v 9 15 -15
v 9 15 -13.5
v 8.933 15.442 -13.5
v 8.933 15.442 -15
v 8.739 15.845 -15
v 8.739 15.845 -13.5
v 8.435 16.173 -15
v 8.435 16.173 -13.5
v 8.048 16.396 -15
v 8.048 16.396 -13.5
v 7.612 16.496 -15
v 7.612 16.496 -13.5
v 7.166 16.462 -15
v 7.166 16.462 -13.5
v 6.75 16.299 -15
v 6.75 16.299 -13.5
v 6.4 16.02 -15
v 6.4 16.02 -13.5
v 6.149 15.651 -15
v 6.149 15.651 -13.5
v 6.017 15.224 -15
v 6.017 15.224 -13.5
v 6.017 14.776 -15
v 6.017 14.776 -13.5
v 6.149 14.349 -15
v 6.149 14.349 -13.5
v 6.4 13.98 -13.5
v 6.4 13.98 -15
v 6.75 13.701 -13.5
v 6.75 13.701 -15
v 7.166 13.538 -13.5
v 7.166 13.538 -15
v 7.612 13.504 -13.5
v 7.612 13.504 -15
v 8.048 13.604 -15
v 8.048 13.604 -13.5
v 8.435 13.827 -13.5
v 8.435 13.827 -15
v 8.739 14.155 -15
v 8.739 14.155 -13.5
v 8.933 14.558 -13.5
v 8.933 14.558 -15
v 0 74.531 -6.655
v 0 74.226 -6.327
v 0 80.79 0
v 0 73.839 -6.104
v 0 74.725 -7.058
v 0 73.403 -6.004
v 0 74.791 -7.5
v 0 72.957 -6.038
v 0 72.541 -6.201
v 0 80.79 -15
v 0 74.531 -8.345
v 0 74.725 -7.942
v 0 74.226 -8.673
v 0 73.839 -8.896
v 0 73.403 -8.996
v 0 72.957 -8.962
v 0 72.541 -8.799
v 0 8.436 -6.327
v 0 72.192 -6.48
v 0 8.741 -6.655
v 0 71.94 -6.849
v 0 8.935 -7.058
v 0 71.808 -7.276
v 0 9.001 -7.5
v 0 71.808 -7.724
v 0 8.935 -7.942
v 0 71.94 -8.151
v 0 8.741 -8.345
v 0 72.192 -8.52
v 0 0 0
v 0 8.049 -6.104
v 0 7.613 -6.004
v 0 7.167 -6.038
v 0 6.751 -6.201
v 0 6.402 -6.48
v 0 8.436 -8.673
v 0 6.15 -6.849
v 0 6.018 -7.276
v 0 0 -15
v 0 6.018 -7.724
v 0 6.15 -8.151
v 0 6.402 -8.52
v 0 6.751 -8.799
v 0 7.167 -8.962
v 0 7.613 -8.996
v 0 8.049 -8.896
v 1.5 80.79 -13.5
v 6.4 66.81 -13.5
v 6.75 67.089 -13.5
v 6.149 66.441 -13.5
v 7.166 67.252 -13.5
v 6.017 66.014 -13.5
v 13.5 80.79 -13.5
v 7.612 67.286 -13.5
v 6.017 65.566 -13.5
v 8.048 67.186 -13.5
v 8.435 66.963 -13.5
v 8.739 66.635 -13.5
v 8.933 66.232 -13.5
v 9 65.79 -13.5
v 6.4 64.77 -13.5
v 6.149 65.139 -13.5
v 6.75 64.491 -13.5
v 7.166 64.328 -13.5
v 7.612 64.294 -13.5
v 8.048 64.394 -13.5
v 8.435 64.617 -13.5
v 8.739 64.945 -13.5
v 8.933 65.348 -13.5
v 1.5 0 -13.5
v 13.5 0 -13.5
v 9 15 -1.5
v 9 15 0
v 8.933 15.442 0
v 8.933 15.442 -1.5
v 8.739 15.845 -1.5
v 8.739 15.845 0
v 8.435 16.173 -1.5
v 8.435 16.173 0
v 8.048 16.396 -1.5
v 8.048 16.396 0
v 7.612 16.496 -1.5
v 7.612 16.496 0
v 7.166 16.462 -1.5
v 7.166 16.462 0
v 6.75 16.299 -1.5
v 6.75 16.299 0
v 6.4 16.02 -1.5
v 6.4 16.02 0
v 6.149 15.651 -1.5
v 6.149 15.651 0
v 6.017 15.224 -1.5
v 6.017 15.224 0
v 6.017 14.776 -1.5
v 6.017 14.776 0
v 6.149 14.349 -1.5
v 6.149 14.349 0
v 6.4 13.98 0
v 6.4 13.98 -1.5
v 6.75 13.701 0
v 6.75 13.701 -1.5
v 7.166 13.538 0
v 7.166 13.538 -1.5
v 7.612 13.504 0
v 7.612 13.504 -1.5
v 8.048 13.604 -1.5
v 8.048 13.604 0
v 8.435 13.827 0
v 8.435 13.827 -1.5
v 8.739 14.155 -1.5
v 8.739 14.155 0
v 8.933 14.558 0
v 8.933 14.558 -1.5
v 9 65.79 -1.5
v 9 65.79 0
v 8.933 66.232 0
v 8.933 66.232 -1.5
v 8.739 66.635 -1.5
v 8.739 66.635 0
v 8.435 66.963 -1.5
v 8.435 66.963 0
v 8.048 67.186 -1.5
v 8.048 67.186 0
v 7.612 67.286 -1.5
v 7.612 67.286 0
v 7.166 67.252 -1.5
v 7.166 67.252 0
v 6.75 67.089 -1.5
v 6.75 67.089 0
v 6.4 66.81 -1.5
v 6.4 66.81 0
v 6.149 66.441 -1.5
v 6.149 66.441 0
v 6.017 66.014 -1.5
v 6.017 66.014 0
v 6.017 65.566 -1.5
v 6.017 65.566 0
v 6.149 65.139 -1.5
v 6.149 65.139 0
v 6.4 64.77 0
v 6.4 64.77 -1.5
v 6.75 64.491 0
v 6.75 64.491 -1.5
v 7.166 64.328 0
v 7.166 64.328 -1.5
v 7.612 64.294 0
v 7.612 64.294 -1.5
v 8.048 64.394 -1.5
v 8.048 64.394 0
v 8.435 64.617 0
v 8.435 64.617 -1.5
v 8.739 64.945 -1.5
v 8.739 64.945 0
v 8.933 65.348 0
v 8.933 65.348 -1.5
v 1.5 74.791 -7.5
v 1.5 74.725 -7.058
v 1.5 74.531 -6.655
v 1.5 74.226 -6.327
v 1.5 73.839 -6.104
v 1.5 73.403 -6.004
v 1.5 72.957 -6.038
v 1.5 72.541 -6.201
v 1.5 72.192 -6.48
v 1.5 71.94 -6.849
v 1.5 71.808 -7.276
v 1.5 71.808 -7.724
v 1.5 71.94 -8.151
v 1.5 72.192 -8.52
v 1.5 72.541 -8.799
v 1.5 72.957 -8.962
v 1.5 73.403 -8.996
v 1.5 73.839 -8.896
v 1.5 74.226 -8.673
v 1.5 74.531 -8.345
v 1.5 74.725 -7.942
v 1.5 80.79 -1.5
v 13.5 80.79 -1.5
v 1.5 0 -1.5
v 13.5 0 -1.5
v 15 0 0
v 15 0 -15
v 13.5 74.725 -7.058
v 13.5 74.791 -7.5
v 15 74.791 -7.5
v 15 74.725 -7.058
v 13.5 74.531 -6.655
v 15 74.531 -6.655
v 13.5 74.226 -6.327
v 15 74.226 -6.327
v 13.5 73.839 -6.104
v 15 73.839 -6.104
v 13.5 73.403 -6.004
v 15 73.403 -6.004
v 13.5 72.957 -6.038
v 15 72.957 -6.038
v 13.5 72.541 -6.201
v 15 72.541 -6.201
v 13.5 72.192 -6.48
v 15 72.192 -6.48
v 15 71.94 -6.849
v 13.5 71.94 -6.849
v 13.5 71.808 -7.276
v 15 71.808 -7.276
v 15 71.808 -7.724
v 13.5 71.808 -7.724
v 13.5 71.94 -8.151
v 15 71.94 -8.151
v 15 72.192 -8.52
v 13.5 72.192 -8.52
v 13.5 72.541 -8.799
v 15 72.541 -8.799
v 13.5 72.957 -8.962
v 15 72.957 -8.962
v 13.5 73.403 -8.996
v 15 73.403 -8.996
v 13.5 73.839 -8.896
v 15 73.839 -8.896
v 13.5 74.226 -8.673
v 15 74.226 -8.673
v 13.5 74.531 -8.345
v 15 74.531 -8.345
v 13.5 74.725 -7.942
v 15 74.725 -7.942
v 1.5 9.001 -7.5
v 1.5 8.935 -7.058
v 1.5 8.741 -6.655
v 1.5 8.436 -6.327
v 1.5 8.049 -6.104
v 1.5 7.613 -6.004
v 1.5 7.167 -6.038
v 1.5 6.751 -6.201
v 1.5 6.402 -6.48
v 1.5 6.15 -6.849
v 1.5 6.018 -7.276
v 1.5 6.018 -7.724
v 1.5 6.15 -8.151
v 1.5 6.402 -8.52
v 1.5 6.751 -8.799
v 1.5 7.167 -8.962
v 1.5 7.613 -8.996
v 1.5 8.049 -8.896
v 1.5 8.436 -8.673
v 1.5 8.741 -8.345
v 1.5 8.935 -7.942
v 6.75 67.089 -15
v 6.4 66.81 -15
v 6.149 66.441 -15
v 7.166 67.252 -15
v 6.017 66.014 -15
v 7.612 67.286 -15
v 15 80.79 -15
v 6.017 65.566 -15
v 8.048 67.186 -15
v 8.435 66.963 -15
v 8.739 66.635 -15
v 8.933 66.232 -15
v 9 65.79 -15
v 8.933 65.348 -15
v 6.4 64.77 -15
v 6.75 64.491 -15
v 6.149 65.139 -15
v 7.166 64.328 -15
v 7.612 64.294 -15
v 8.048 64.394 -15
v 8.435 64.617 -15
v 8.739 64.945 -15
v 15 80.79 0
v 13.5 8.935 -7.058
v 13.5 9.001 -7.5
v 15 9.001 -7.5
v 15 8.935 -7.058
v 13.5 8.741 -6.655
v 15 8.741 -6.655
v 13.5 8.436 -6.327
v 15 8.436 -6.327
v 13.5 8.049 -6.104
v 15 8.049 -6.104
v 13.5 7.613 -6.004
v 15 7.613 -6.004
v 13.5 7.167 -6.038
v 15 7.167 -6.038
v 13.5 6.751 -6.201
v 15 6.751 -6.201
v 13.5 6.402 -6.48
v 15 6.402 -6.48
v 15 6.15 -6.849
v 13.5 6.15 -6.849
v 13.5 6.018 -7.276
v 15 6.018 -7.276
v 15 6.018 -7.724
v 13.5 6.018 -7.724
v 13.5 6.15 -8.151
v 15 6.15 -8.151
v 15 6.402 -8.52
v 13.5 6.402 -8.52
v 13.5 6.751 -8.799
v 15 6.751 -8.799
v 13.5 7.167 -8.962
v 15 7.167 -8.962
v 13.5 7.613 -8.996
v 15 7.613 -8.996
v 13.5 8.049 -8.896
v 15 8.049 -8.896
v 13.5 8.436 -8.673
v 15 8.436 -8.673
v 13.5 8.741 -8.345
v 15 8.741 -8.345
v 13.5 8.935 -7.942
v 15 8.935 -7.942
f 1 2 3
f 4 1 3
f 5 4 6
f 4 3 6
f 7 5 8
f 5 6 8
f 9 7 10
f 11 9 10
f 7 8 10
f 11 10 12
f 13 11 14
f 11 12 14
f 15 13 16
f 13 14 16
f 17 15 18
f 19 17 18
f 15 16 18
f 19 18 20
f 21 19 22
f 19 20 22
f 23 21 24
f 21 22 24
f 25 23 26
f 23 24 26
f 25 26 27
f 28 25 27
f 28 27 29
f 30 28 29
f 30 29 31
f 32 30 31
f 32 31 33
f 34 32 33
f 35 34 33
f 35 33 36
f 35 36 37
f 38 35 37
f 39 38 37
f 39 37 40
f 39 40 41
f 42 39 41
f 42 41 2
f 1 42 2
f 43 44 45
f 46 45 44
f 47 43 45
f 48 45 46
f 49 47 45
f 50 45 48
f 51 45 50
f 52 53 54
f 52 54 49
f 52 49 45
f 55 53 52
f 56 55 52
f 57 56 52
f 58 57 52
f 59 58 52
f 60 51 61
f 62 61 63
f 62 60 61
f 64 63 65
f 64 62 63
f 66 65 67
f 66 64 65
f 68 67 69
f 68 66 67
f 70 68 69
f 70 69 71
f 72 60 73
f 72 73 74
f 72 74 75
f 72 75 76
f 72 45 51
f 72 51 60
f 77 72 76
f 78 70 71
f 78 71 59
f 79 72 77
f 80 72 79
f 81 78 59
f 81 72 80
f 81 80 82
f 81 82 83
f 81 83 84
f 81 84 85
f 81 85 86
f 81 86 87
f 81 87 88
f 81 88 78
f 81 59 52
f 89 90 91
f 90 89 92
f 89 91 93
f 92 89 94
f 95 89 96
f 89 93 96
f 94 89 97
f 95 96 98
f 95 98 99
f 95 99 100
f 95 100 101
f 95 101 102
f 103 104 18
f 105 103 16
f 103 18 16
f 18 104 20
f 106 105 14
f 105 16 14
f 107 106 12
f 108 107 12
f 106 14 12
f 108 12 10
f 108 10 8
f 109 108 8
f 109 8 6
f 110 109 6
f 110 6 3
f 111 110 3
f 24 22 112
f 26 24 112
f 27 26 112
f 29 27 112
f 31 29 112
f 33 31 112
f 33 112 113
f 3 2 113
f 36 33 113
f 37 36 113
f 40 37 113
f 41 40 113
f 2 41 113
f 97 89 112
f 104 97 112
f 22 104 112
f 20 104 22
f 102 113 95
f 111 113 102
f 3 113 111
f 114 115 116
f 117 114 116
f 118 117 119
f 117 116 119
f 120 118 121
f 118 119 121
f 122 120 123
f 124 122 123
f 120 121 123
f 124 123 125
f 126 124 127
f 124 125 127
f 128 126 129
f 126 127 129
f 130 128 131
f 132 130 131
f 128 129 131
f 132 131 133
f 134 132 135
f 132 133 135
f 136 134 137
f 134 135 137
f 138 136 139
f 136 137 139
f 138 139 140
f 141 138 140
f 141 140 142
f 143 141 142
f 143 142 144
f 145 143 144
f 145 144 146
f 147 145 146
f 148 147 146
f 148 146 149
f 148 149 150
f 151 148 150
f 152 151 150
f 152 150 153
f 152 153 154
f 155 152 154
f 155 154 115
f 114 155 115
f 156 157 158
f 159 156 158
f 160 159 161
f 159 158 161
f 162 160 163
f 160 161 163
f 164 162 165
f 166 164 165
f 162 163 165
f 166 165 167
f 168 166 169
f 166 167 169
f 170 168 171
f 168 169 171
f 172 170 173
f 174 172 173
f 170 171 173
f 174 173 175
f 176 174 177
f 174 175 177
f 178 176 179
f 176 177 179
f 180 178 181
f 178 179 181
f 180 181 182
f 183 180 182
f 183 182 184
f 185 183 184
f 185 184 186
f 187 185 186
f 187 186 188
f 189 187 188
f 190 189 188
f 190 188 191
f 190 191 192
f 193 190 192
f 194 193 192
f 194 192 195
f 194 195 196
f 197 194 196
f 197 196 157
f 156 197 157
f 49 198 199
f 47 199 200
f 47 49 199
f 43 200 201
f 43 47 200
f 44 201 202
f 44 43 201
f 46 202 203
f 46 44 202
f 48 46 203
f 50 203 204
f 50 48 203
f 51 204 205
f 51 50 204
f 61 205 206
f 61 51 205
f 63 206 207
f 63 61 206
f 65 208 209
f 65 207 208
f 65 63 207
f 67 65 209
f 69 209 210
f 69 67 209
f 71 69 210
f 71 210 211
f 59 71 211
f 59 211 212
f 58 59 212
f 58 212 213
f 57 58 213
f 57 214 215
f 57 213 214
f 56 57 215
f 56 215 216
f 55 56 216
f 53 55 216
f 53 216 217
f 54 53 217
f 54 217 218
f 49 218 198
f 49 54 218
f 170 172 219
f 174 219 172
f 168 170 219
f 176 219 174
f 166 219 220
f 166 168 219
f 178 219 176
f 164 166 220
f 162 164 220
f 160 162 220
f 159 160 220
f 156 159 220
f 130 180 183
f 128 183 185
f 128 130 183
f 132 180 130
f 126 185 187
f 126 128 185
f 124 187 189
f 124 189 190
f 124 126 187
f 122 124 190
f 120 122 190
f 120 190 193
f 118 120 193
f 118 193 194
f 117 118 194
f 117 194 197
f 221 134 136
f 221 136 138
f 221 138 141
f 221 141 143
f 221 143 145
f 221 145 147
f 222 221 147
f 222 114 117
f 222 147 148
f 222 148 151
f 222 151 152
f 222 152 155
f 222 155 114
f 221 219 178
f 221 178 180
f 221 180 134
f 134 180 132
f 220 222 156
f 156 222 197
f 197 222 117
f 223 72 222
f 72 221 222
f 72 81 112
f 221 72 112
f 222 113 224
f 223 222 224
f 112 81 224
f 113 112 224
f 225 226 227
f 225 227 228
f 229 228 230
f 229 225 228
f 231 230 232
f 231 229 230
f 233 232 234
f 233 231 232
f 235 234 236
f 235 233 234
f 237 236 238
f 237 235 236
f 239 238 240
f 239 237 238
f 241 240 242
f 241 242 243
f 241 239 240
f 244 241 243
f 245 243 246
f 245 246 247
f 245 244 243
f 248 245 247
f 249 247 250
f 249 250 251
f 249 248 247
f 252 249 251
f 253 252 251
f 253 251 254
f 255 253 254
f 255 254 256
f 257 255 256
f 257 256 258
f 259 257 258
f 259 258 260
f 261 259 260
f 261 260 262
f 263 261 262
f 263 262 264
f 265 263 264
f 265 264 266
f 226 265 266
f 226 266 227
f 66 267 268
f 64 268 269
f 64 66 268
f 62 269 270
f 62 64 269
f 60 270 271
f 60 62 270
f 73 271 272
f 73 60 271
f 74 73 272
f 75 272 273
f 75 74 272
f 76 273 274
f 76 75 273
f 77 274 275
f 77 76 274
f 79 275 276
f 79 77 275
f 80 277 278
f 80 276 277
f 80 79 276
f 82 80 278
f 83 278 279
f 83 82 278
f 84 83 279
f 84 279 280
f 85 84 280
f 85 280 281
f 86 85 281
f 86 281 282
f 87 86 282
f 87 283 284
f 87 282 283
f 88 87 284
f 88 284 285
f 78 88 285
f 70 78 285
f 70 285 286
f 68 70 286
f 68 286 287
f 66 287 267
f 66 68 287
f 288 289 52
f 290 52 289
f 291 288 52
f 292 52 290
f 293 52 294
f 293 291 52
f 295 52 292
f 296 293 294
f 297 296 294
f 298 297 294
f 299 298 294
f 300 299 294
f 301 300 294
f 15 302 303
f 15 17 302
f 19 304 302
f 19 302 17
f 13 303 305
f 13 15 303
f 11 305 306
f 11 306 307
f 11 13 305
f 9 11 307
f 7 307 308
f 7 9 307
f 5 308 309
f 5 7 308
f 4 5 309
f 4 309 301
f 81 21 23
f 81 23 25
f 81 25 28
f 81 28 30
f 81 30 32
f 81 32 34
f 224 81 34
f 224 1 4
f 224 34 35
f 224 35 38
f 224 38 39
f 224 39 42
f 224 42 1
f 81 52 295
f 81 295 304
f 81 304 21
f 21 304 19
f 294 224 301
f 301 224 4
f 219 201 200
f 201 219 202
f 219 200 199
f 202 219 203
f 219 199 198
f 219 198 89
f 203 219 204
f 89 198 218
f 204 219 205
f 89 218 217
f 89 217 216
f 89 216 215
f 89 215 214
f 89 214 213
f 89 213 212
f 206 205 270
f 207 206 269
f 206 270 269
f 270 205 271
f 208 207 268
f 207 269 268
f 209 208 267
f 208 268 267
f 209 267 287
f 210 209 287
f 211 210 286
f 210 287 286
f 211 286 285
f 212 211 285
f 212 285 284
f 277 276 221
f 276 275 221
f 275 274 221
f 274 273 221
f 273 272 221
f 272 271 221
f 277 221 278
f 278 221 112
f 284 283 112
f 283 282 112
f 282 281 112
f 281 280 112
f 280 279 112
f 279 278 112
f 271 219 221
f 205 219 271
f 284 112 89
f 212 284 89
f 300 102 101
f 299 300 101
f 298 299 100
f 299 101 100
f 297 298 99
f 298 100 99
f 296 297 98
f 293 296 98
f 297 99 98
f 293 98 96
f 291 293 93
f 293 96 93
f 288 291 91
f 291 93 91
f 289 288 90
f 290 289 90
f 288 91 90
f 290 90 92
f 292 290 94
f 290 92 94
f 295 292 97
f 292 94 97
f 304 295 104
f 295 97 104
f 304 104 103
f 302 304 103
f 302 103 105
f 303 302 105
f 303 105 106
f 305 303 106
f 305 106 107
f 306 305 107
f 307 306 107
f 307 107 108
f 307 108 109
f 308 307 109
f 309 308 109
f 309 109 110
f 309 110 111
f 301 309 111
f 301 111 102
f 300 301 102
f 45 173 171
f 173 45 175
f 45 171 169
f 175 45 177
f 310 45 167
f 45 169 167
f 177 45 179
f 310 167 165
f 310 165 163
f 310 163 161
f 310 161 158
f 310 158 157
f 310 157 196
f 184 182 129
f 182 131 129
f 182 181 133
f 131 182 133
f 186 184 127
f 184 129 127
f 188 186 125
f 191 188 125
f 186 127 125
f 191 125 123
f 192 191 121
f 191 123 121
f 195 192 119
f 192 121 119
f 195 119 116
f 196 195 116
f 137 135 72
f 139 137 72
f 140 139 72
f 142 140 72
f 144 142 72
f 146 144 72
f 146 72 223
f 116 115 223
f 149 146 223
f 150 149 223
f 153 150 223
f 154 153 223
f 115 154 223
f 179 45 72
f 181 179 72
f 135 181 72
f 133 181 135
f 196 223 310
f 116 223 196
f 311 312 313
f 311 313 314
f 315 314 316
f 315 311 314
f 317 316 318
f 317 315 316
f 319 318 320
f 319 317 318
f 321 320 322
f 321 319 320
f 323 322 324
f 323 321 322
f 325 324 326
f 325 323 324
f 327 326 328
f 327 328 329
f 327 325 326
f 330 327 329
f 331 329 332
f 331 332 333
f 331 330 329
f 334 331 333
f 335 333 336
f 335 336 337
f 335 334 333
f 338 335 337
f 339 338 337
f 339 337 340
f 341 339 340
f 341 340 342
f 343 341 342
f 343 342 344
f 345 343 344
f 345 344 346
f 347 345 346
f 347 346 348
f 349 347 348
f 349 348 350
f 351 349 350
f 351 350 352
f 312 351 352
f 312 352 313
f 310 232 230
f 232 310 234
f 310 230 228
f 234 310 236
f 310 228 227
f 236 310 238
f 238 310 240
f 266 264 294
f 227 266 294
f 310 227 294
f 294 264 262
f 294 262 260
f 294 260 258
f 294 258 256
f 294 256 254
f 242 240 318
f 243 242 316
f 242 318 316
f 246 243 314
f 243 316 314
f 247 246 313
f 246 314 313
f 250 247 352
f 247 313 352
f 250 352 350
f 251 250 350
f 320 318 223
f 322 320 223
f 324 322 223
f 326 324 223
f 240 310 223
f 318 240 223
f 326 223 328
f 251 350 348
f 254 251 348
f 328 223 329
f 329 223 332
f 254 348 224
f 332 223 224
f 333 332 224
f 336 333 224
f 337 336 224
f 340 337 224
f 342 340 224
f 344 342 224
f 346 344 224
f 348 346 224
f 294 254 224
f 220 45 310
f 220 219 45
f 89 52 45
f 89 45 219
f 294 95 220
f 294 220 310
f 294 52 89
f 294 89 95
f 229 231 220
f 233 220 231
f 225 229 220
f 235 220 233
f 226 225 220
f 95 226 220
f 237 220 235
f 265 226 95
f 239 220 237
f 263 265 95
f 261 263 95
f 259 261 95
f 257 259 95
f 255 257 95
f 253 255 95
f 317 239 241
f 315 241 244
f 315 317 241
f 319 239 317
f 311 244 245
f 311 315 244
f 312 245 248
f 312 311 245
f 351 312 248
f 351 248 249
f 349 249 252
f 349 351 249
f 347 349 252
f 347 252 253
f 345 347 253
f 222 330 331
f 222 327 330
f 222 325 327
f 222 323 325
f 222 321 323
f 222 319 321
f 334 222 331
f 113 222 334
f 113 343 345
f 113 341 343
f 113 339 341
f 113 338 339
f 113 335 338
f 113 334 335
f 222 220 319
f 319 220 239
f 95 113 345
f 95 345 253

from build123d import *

# Parameters (mm, degrees)
SKETCH1_W              = 15
SKETCH1_H              = 15
SKETCH1_W_2            = 12
SKETCH1_H_2            = 12
EXTRUDE_THIN1_DEPTH    = 80.79
CUT_EXTRUDE1_OUTLINE_R = 1.5
CUT_EXTRUDE1_DEPTH     = 15
SKETCH3_R              = 1.5
CUT_EXTRUDE2_DEPTH     = 84.528582533


# Read off the part's stored shape, not the designer's step: Cut-Extrude1
with BuildPart() as part:
    # Sketch1 → Extrude-Thin1 (new body)
    with BuildSketch(Plane(origin=(0, 0, 0), x_dir=(1, 0, 0), z_dir=(0, 1, 0))):
        with Locations((7.5, 7.5)):
            Rectangle(SKETCH1_W, SKETCH1_H)
        with Locations((7.5, 7.5)):
            Rectangle(SKETCH1_W_2, SKETCH1_H_2, mode=Mode.SUBTRACT)
    extrude(amount=EXTRUDE_THIN1_DEPTH)

    # Cut-Extrude1 outline → Cut-Extrude1 (cut)
    with BuildSketch(Plane.YZ):
        with Locations((73.291264227, -7.5)):
            Circle(CUT_EXTRUDE1_OUTLINE_R)
        with Locations((7.501264227, -7.5)):
            Circle(CUT_EXTRUDE1_OUTLINE_R)
    extrude(amount=CUT_EXTRUDE1_DEPTH, mode=Mode.SUBTRACT)

    # Sketch3 → Cut-Extrude2 (cut, through all)
    with BuildSketch(Plane.XY):
        with Locations((7.5, 15)):
            Circle(SKETCH3_R)
        with Locations((7.5, 65.79)):
            Circle(SKETCH3_R)
    extrude(amount=-CUT_EXTRUDE2_DEPTH, mode=Mode.SUBTRACT)


solid = part.part
